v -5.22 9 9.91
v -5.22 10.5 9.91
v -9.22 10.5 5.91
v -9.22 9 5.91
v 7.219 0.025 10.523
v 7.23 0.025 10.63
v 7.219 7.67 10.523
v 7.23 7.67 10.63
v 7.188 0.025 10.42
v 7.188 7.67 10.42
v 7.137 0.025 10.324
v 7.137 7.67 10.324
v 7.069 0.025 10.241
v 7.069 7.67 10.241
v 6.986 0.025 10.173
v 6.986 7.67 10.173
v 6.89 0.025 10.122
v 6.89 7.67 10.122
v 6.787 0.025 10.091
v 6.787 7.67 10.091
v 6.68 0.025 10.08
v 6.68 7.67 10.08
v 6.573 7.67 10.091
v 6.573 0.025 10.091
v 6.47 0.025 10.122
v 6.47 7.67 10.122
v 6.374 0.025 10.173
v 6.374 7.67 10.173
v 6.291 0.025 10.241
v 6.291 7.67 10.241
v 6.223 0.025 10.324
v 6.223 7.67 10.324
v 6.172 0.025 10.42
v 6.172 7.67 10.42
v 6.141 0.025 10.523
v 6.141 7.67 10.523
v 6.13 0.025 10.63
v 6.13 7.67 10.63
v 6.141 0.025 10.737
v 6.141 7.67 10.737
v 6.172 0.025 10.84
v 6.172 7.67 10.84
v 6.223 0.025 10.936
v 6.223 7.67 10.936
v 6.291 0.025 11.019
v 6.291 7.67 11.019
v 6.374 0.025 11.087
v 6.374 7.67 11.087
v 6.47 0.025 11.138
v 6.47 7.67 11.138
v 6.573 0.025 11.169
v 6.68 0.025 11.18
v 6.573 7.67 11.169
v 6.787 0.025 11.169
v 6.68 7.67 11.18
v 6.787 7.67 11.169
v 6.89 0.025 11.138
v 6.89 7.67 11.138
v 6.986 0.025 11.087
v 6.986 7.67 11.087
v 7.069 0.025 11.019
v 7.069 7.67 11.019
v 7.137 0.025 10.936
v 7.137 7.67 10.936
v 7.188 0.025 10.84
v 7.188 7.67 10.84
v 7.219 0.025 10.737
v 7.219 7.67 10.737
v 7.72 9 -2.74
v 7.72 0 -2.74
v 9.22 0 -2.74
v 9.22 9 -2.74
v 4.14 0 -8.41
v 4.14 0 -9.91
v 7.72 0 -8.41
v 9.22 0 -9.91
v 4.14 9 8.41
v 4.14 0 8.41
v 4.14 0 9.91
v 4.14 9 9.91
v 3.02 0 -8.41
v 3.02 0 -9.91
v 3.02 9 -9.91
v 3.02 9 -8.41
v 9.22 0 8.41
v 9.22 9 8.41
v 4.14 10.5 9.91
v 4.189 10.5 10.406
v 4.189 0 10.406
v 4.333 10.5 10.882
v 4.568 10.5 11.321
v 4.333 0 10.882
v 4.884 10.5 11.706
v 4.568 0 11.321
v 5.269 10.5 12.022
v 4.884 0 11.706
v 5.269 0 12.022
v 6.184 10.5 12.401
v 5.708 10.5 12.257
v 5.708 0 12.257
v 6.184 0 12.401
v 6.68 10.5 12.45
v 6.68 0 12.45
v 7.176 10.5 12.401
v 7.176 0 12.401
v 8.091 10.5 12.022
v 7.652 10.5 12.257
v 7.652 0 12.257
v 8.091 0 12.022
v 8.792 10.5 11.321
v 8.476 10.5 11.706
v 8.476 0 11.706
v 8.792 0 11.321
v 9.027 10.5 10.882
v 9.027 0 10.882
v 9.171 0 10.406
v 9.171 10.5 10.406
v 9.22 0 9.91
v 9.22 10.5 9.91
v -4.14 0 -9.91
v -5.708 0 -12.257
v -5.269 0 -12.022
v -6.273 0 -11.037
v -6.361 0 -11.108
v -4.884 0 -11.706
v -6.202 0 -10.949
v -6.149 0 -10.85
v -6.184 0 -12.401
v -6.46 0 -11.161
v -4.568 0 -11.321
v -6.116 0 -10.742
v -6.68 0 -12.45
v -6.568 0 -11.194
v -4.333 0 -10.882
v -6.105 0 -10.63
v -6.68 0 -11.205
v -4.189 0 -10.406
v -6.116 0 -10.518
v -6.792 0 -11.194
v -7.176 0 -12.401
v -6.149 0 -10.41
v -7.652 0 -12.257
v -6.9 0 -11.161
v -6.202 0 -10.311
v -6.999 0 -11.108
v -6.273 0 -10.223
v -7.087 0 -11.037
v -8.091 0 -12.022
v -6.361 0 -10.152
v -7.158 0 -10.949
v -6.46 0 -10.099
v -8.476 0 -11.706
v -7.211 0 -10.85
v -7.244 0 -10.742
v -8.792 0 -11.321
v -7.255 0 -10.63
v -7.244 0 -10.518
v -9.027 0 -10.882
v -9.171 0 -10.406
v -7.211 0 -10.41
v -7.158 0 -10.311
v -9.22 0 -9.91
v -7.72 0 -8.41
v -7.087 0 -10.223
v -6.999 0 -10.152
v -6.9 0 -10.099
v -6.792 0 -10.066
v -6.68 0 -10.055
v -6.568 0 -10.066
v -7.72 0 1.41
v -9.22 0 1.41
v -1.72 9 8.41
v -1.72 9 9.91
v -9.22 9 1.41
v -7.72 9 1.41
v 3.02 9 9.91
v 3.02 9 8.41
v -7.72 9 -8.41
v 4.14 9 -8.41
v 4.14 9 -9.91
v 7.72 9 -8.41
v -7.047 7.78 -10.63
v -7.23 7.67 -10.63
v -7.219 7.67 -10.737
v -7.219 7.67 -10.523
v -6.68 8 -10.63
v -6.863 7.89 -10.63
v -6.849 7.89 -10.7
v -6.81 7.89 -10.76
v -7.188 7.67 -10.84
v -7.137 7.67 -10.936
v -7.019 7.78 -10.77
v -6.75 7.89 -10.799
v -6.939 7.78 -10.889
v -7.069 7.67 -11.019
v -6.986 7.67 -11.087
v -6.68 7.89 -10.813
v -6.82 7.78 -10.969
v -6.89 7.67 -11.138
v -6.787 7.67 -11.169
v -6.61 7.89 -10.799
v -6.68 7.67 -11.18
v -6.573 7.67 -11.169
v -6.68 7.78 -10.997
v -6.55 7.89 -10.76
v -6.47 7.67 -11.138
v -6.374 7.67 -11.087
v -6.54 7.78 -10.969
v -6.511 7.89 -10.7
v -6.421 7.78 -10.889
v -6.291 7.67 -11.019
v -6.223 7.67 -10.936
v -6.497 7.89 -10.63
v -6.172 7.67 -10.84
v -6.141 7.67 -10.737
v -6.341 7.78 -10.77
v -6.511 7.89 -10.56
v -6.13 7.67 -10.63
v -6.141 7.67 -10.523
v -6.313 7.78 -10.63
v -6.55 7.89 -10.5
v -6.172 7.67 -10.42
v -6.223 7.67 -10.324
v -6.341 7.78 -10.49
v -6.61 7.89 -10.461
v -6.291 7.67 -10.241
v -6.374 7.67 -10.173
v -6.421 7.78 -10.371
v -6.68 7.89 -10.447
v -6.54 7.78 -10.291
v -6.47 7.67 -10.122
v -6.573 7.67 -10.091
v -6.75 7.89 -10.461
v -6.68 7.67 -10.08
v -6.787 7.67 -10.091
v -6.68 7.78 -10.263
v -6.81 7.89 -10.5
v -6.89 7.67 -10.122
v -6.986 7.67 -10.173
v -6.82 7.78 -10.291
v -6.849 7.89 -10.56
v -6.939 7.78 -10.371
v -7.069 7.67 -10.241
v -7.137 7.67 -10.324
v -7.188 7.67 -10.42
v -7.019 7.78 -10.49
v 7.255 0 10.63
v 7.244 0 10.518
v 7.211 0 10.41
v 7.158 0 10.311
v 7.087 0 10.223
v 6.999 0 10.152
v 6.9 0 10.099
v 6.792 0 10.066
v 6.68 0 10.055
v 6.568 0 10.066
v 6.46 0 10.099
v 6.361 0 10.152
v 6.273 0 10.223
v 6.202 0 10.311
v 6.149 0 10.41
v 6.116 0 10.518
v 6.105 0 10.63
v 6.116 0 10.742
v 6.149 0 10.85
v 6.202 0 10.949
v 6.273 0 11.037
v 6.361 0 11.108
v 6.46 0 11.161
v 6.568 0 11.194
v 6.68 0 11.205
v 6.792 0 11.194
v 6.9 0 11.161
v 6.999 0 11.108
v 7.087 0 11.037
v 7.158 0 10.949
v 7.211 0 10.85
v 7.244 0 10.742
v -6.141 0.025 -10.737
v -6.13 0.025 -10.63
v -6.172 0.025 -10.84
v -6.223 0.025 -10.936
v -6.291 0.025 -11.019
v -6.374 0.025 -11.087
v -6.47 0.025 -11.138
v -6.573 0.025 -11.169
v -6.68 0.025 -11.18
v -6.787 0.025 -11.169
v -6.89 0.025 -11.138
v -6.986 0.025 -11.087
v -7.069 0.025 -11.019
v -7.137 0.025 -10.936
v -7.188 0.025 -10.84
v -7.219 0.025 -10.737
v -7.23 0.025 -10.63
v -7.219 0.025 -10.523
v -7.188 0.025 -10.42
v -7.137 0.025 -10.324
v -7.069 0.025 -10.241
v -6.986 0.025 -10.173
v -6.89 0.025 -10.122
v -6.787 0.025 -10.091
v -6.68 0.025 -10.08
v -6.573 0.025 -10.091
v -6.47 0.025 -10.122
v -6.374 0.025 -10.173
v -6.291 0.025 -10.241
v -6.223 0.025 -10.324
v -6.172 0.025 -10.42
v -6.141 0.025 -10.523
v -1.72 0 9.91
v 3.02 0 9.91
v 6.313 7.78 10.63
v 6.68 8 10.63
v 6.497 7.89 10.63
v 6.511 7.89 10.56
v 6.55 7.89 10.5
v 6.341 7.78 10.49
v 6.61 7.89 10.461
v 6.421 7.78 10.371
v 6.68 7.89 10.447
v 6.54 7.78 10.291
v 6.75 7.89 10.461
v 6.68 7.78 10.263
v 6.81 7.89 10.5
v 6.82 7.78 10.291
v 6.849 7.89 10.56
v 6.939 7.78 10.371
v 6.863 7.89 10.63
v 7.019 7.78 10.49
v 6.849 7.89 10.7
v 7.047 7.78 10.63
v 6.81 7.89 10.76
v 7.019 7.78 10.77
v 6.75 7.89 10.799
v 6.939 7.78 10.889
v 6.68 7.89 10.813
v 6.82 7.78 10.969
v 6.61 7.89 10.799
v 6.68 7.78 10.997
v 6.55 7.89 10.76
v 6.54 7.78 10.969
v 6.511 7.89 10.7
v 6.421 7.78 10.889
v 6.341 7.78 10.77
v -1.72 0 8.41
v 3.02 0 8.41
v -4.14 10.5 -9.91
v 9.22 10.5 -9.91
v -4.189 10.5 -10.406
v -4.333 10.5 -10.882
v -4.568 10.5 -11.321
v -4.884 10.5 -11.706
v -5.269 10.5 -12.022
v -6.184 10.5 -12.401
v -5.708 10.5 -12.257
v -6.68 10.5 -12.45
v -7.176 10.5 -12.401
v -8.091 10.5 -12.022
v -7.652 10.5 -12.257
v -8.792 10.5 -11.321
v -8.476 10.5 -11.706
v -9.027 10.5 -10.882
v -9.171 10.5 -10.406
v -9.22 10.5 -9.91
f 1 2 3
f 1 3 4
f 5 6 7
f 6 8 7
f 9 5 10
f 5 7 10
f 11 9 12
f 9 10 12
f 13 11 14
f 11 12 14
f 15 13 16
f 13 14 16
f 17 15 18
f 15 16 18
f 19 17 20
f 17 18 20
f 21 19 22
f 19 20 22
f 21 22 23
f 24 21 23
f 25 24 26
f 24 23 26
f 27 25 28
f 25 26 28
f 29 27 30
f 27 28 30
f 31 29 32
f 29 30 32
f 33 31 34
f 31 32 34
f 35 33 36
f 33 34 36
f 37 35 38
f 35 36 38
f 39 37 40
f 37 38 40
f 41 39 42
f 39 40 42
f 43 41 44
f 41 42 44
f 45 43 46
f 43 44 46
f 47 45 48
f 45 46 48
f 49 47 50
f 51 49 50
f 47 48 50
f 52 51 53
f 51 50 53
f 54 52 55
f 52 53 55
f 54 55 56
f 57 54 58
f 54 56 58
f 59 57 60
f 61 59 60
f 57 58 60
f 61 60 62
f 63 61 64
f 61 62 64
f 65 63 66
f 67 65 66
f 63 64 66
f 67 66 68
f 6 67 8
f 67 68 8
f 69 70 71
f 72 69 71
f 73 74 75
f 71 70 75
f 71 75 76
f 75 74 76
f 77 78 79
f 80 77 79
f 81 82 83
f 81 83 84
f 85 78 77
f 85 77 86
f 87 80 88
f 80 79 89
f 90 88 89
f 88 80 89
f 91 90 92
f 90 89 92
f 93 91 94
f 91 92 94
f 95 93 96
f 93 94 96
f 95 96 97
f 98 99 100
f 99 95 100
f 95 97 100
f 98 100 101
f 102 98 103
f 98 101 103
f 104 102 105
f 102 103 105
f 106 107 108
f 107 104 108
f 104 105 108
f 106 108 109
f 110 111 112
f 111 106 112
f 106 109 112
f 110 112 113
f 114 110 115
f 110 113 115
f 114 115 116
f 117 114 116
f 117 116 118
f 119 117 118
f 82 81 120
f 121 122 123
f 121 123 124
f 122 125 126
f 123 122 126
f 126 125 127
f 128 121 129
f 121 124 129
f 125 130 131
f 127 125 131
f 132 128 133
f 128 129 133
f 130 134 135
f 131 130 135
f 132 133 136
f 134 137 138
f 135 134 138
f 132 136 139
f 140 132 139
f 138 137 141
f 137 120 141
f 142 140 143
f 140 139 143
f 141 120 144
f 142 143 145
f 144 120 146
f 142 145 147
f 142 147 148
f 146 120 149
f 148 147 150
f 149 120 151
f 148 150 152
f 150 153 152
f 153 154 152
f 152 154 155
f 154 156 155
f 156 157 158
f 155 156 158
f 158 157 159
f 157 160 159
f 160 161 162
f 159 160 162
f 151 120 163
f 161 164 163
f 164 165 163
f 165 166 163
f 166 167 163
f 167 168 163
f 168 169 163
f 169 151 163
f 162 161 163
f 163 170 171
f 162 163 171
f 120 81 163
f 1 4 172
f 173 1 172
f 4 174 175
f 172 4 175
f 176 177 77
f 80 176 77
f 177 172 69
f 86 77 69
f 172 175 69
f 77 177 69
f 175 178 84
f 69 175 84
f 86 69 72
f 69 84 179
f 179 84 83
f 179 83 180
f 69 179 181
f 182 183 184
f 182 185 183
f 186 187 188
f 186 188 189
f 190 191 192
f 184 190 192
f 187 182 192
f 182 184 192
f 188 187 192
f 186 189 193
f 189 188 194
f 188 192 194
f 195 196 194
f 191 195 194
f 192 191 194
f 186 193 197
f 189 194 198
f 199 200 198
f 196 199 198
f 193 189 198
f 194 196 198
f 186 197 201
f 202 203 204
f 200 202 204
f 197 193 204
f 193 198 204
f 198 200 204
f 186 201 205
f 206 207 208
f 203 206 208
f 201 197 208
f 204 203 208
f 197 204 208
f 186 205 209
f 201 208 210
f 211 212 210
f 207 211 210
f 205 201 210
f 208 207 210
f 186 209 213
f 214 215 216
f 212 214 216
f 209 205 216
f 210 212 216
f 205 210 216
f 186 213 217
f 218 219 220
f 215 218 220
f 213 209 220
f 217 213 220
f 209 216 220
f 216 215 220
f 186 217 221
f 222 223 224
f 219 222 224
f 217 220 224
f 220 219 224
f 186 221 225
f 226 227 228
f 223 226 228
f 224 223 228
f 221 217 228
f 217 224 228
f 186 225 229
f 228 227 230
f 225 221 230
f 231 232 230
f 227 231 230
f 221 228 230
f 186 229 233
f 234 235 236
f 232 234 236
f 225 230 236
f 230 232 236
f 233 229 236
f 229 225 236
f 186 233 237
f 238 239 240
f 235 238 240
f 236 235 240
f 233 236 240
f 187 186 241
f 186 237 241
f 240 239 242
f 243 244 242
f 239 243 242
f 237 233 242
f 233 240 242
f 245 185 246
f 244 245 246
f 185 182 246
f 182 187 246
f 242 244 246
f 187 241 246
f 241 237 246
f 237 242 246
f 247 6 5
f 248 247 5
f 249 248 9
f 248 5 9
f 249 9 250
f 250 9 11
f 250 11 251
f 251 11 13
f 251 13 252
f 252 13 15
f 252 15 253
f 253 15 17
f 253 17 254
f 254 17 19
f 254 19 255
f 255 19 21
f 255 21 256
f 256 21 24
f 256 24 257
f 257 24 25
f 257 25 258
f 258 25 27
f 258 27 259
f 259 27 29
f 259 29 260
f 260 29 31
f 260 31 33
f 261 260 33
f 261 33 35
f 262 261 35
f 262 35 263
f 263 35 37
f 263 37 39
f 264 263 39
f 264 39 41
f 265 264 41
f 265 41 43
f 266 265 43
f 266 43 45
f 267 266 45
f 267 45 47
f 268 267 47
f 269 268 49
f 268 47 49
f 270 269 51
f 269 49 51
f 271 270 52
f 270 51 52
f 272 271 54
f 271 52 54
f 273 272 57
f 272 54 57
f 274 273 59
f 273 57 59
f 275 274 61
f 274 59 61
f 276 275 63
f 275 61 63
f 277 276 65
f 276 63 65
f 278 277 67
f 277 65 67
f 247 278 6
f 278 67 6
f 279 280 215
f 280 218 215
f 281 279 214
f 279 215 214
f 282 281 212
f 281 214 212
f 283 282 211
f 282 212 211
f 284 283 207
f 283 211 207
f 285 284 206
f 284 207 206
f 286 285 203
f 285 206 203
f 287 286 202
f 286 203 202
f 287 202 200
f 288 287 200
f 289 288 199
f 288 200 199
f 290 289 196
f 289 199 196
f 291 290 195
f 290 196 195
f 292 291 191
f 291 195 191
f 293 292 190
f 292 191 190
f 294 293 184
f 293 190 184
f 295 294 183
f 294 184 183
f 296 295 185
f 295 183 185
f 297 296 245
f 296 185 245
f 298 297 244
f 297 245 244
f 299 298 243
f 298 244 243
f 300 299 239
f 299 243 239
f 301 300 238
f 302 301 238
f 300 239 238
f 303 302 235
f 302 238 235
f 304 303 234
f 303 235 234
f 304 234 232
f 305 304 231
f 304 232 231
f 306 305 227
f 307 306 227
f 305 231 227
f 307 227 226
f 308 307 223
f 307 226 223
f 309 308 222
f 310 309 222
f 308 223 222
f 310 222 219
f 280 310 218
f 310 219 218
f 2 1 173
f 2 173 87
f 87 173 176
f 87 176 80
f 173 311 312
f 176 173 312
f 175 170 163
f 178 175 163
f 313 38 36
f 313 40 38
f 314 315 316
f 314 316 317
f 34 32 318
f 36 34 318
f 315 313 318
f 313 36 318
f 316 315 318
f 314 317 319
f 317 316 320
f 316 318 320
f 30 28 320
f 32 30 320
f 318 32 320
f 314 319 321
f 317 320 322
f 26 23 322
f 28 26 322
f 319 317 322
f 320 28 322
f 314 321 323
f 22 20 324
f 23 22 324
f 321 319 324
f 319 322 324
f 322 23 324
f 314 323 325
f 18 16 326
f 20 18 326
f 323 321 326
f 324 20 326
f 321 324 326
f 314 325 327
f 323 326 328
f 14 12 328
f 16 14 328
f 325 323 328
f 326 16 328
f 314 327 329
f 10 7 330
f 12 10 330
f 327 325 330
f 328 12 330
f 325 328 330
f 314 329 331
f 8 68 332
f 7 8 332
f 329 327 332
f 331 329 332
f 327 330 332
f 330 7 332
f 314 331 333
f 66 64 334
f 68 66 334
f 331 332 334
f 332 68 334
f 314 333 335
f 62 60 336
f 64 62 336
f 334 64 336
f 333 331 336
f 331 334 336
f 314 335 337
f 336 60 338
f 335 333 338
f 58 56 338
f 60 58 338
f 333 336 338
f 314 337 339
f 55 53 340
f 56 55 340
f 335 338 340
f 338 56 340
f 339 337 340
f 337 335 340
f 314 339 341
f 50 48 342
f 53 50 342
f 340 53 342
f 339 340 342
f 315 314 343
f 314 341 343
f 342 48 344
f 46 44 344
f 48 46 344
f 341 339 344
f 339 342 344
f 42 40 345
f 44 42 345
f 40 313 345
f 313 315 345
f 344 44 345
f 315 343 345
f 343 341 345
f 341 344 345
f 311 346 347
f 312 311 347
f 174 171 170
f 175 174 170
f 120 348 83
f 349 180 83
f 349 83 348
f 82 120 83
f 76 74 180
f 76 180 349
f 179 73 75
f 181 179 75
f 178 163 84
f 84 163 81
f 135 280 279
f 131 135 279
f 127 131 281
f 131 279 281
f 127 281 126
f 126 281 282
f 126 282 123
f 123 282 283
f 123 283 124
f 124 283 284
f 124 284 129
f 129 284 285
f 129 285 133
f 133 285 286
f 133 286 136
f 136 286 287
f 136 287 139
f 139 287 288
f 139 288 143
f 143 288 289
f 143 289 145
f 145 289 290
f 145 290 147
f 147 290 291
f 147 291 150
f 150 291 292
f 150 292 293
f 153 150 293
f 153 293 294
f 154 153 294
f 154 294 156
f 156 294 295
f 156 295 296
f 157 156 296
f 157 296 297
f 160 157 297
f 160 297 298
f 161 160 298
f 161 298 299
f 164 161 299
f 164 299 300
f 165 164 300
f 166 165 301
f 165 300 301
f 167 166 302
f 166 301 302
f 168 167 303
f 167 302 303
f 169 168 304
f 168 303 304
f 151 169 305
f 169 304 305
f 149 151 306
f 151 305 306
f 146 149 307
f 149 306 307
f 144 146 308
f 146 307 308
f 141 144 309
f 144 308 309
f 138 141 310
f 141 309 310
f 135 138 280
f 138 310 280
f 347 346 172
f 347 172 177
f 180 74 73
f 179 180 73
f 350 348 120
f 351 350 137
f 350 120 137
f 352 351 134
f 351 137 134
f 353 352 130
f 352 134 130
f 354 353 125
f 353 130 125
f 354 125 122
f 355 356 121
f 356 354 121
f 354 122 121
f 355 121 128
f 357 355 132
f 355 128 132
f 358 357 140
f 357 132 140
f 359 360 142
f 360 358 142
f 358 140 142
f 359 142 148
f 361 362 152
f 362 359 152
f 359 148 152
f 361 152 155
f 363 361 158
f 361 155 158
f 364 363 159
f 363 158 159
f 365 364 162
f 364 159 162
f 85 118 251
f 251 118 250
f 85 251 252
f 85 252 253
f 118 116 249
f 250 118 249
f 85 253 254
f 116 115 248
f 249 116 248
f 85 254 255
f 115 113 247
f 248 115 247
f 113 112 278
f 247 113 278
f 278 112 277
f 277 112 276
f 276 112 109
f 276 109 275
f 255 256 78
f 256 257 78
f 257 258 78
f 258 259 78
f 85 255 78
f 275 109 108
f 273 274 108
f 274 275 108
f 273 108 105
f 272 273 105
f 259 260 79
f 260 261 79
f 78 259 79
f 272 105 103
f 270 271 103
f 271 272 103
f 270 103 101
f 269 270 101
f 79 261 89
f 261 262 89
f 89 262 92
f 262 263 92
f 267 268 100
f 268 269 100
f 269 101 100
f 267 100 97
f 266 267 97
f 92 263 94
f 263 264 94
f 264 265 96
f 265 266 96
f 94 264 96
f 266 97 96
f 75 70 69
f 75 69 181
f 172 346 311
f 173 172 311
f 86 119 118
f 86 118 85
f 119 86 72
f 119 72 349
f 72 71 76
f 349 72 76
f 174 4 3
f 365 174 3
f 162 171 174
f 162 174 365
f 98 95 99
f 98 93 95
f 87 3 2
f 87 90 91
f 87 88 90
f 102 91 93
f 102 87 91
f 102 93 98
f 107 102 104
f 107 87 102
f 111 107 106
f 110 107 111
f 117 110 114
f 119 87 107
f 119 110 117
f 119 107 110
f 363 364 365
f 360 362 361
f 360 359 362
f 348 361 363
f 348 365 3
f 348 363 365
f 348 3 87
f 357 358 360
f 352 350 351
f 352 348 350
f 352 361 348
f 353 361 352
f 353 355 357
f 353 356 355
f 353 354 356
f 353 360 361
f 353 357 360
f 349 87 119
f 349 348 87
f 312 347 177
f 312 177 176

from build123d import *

# Parameters (mm, degrees)
SKETCH_1_W             = 15.44
SKETCH_1_H             = 16.82
EXTRUDE_1_DEPTH        = 9
SHELL_3_T              = 1.5
SKETCH_2_W             = 1.5
SKETCH_2_H             = 11.15
CUT_EXTRUDE_1_DEPTH    = 9
SKETCH_3_W             = 7.5
SKETCH_3_H             = 8.5
CUT_EXTRUDE_2_DEPTH    = 9
SKETCH_4_W             = 1.12
SKETCH_4_H             = 1.5
CUT_EXTRUDE_3_DEPTH    = 9
CHAMFER_1_SIZE         = 4
EXTRUDE_2_REACH        = 19.131
M1_4X0_3_1_D           = 1.1
M1_4X0_3_1_DEPTH       = 7.66952666
M1_4X0_3_1_CSINK_D     = 1.15
M1_4X0_3_1_CSINK_ANGLE = 90
M1_4X0_3_1_TIP         = 0.33047334


with BuildPart() as part:
    # 草图1 → 凸台-拉伸1 (new body)
    with BuildSketch(Plane(origin=(0, 0, 0), x_dir=(1, 0, 0), z_dir=(0, 1, 0))):
        Rectangle(SKETCH_1_W, SKETCH_1_H)
    extrude(amount=EXTRUDE_1_DEPTH)

    # 抽壳3
    shell_3_openings = [part.faces().sort_by_distance(p)[0] for p in [
        (0, 0, 0),
    ]]
    offset(amount=SHELL_3_T, openings=shell_3_openings, kind=Kind.INTERSECTION)

    # 草图2 → 切除-拉伸1 (cut)
    with BuildSketch(Plane.XZ):
        with Locations((8.47, 2.835)):
            Rectangle(SKETCH_2_W, SKETCH_2_H)
    extrude(amount=-CUT_EXTRUDE_1_DEPTH, mode=Mode.SUBTRACT)

    # 草图3 → 切除-拉伸2 (cut)
    with BuildSketch(Plane.XZ):
        with Locations((-5.47, 5.66)):
            Rectangle(SKETCH_3_W, SKETCH_3_H)
    extrude(amount=-CUT_EXTRUDE_2_DEPTH, mode=Mode.SUBTRACT)

    # 草图4 → 切除-拉伸3 (cut)
    with BuildSketch(Plane.XZ):
        with Locations((3.58, 9.16)):
            Rectangle(SKETCH_4_W, SKETCH_4_H)
        with Locations((3.58, -9.16)):
            Rectangle(SKETCH_4_W, SKETCH_4_H)
    extrude(amount=-CUT_EXTRUDE_3_DEPTH, mode=Mode.SUBTRACT)

    # 倒角1
    chamfer_1_edges = [part.edges().sort_by_distance(p)[0] for p in [
        (-9.22, 9.75, 9.91),
    ]]
    chamfer(chamfer_1_edges, length=CHAMFER_1_SIZE)

    # 凸台-拉伸2: up to this face of the body (flat: up to its plane)
    extrude_2_end = Plane(part.part.faces().sort_by_distance((0.176494327, 10.5, -0.191935716))[0])
    # 草图5 → 凸台-拉伸2 (add, up to the picked face)
    with BuildSketch(Plane.XZ, mode=Mode.PRIVATE) as extrude_2_sk1:
        with BuildLine():
            Line((9.22, 9.91), (4.14, 9.91))
            ThreePointArc((4.14, 9.91), (6.68, 12.45), (9.22, 9.91))
        make_face()
    extrude_2_tool1 = split(extrude(extrude_2_sk1.sketch, amount=-EXTRUDE_2_REACH, mode=Mode.PRIVATE), bisect_by=extrude_2_end, keep=Keep.BOTH, mode=Mode.PRIVATE)
    # 草图5 → 凸台-拉伸2 (add, up to the picked face)
    with BuildSketch(Plane.XZ, mode=Mode.PRIVATE) as extrude_2_sk2:
        with BuildLine():
            Line((-9.22, -9.91), (-4.14, -9.91))
            ThreePointArc((-4.14, -9.91), (-6.68, -12.45), (-9.22, -9.91))
        make_face()
    extrude_2_tool2 = split(extrude(extrude_2_sk2.sketch, amount=-EXTRUDE_2_REACH, mode=Mode.PRIVATE), bisect_by=extrude_2_end, keep=Keep.BOTH, mode=Mode.PRIVATE)
    add(extrude_2_tool1.solids().sort_by(Axis((6.68, 0, 10.988009), (0, 1, 0)))[0])
    add(extrude_2_tool2.solids().sort_by(Axis((-6.68, 0, -10.988009), (0, 1, 0)))[0])

    # M1.4X0.3 螺纹孔的螺纹孔钻头1
    with Locations(Plane(origin=(0, 0, 0), x_dir=(-1, 0, 0), z_dir=(0, -1, 0))):
        with Locations((6.68, 10.63), (-6.68, -10.63)):
            CounterSinkHole(M1_4X0_3_1_D / 2, M1_4X0_3_1_CSINK_D / 2, depth=M1_4X0_3_1_DEPTH, counter_sink_angle=M1_4X0_3_1_CSINK_ANGLE)
            with Locations((0, 0, -(M1_4X0_3_1_DEPTH + M1_4X0_3_1_TIP / 2))):  # 118° drill point
                Cone(0, M1_4X0_3_1_D / 2, M1_4X0_3_1_TIP, mode=Mode.SUBTRACT)


solid = part.part
